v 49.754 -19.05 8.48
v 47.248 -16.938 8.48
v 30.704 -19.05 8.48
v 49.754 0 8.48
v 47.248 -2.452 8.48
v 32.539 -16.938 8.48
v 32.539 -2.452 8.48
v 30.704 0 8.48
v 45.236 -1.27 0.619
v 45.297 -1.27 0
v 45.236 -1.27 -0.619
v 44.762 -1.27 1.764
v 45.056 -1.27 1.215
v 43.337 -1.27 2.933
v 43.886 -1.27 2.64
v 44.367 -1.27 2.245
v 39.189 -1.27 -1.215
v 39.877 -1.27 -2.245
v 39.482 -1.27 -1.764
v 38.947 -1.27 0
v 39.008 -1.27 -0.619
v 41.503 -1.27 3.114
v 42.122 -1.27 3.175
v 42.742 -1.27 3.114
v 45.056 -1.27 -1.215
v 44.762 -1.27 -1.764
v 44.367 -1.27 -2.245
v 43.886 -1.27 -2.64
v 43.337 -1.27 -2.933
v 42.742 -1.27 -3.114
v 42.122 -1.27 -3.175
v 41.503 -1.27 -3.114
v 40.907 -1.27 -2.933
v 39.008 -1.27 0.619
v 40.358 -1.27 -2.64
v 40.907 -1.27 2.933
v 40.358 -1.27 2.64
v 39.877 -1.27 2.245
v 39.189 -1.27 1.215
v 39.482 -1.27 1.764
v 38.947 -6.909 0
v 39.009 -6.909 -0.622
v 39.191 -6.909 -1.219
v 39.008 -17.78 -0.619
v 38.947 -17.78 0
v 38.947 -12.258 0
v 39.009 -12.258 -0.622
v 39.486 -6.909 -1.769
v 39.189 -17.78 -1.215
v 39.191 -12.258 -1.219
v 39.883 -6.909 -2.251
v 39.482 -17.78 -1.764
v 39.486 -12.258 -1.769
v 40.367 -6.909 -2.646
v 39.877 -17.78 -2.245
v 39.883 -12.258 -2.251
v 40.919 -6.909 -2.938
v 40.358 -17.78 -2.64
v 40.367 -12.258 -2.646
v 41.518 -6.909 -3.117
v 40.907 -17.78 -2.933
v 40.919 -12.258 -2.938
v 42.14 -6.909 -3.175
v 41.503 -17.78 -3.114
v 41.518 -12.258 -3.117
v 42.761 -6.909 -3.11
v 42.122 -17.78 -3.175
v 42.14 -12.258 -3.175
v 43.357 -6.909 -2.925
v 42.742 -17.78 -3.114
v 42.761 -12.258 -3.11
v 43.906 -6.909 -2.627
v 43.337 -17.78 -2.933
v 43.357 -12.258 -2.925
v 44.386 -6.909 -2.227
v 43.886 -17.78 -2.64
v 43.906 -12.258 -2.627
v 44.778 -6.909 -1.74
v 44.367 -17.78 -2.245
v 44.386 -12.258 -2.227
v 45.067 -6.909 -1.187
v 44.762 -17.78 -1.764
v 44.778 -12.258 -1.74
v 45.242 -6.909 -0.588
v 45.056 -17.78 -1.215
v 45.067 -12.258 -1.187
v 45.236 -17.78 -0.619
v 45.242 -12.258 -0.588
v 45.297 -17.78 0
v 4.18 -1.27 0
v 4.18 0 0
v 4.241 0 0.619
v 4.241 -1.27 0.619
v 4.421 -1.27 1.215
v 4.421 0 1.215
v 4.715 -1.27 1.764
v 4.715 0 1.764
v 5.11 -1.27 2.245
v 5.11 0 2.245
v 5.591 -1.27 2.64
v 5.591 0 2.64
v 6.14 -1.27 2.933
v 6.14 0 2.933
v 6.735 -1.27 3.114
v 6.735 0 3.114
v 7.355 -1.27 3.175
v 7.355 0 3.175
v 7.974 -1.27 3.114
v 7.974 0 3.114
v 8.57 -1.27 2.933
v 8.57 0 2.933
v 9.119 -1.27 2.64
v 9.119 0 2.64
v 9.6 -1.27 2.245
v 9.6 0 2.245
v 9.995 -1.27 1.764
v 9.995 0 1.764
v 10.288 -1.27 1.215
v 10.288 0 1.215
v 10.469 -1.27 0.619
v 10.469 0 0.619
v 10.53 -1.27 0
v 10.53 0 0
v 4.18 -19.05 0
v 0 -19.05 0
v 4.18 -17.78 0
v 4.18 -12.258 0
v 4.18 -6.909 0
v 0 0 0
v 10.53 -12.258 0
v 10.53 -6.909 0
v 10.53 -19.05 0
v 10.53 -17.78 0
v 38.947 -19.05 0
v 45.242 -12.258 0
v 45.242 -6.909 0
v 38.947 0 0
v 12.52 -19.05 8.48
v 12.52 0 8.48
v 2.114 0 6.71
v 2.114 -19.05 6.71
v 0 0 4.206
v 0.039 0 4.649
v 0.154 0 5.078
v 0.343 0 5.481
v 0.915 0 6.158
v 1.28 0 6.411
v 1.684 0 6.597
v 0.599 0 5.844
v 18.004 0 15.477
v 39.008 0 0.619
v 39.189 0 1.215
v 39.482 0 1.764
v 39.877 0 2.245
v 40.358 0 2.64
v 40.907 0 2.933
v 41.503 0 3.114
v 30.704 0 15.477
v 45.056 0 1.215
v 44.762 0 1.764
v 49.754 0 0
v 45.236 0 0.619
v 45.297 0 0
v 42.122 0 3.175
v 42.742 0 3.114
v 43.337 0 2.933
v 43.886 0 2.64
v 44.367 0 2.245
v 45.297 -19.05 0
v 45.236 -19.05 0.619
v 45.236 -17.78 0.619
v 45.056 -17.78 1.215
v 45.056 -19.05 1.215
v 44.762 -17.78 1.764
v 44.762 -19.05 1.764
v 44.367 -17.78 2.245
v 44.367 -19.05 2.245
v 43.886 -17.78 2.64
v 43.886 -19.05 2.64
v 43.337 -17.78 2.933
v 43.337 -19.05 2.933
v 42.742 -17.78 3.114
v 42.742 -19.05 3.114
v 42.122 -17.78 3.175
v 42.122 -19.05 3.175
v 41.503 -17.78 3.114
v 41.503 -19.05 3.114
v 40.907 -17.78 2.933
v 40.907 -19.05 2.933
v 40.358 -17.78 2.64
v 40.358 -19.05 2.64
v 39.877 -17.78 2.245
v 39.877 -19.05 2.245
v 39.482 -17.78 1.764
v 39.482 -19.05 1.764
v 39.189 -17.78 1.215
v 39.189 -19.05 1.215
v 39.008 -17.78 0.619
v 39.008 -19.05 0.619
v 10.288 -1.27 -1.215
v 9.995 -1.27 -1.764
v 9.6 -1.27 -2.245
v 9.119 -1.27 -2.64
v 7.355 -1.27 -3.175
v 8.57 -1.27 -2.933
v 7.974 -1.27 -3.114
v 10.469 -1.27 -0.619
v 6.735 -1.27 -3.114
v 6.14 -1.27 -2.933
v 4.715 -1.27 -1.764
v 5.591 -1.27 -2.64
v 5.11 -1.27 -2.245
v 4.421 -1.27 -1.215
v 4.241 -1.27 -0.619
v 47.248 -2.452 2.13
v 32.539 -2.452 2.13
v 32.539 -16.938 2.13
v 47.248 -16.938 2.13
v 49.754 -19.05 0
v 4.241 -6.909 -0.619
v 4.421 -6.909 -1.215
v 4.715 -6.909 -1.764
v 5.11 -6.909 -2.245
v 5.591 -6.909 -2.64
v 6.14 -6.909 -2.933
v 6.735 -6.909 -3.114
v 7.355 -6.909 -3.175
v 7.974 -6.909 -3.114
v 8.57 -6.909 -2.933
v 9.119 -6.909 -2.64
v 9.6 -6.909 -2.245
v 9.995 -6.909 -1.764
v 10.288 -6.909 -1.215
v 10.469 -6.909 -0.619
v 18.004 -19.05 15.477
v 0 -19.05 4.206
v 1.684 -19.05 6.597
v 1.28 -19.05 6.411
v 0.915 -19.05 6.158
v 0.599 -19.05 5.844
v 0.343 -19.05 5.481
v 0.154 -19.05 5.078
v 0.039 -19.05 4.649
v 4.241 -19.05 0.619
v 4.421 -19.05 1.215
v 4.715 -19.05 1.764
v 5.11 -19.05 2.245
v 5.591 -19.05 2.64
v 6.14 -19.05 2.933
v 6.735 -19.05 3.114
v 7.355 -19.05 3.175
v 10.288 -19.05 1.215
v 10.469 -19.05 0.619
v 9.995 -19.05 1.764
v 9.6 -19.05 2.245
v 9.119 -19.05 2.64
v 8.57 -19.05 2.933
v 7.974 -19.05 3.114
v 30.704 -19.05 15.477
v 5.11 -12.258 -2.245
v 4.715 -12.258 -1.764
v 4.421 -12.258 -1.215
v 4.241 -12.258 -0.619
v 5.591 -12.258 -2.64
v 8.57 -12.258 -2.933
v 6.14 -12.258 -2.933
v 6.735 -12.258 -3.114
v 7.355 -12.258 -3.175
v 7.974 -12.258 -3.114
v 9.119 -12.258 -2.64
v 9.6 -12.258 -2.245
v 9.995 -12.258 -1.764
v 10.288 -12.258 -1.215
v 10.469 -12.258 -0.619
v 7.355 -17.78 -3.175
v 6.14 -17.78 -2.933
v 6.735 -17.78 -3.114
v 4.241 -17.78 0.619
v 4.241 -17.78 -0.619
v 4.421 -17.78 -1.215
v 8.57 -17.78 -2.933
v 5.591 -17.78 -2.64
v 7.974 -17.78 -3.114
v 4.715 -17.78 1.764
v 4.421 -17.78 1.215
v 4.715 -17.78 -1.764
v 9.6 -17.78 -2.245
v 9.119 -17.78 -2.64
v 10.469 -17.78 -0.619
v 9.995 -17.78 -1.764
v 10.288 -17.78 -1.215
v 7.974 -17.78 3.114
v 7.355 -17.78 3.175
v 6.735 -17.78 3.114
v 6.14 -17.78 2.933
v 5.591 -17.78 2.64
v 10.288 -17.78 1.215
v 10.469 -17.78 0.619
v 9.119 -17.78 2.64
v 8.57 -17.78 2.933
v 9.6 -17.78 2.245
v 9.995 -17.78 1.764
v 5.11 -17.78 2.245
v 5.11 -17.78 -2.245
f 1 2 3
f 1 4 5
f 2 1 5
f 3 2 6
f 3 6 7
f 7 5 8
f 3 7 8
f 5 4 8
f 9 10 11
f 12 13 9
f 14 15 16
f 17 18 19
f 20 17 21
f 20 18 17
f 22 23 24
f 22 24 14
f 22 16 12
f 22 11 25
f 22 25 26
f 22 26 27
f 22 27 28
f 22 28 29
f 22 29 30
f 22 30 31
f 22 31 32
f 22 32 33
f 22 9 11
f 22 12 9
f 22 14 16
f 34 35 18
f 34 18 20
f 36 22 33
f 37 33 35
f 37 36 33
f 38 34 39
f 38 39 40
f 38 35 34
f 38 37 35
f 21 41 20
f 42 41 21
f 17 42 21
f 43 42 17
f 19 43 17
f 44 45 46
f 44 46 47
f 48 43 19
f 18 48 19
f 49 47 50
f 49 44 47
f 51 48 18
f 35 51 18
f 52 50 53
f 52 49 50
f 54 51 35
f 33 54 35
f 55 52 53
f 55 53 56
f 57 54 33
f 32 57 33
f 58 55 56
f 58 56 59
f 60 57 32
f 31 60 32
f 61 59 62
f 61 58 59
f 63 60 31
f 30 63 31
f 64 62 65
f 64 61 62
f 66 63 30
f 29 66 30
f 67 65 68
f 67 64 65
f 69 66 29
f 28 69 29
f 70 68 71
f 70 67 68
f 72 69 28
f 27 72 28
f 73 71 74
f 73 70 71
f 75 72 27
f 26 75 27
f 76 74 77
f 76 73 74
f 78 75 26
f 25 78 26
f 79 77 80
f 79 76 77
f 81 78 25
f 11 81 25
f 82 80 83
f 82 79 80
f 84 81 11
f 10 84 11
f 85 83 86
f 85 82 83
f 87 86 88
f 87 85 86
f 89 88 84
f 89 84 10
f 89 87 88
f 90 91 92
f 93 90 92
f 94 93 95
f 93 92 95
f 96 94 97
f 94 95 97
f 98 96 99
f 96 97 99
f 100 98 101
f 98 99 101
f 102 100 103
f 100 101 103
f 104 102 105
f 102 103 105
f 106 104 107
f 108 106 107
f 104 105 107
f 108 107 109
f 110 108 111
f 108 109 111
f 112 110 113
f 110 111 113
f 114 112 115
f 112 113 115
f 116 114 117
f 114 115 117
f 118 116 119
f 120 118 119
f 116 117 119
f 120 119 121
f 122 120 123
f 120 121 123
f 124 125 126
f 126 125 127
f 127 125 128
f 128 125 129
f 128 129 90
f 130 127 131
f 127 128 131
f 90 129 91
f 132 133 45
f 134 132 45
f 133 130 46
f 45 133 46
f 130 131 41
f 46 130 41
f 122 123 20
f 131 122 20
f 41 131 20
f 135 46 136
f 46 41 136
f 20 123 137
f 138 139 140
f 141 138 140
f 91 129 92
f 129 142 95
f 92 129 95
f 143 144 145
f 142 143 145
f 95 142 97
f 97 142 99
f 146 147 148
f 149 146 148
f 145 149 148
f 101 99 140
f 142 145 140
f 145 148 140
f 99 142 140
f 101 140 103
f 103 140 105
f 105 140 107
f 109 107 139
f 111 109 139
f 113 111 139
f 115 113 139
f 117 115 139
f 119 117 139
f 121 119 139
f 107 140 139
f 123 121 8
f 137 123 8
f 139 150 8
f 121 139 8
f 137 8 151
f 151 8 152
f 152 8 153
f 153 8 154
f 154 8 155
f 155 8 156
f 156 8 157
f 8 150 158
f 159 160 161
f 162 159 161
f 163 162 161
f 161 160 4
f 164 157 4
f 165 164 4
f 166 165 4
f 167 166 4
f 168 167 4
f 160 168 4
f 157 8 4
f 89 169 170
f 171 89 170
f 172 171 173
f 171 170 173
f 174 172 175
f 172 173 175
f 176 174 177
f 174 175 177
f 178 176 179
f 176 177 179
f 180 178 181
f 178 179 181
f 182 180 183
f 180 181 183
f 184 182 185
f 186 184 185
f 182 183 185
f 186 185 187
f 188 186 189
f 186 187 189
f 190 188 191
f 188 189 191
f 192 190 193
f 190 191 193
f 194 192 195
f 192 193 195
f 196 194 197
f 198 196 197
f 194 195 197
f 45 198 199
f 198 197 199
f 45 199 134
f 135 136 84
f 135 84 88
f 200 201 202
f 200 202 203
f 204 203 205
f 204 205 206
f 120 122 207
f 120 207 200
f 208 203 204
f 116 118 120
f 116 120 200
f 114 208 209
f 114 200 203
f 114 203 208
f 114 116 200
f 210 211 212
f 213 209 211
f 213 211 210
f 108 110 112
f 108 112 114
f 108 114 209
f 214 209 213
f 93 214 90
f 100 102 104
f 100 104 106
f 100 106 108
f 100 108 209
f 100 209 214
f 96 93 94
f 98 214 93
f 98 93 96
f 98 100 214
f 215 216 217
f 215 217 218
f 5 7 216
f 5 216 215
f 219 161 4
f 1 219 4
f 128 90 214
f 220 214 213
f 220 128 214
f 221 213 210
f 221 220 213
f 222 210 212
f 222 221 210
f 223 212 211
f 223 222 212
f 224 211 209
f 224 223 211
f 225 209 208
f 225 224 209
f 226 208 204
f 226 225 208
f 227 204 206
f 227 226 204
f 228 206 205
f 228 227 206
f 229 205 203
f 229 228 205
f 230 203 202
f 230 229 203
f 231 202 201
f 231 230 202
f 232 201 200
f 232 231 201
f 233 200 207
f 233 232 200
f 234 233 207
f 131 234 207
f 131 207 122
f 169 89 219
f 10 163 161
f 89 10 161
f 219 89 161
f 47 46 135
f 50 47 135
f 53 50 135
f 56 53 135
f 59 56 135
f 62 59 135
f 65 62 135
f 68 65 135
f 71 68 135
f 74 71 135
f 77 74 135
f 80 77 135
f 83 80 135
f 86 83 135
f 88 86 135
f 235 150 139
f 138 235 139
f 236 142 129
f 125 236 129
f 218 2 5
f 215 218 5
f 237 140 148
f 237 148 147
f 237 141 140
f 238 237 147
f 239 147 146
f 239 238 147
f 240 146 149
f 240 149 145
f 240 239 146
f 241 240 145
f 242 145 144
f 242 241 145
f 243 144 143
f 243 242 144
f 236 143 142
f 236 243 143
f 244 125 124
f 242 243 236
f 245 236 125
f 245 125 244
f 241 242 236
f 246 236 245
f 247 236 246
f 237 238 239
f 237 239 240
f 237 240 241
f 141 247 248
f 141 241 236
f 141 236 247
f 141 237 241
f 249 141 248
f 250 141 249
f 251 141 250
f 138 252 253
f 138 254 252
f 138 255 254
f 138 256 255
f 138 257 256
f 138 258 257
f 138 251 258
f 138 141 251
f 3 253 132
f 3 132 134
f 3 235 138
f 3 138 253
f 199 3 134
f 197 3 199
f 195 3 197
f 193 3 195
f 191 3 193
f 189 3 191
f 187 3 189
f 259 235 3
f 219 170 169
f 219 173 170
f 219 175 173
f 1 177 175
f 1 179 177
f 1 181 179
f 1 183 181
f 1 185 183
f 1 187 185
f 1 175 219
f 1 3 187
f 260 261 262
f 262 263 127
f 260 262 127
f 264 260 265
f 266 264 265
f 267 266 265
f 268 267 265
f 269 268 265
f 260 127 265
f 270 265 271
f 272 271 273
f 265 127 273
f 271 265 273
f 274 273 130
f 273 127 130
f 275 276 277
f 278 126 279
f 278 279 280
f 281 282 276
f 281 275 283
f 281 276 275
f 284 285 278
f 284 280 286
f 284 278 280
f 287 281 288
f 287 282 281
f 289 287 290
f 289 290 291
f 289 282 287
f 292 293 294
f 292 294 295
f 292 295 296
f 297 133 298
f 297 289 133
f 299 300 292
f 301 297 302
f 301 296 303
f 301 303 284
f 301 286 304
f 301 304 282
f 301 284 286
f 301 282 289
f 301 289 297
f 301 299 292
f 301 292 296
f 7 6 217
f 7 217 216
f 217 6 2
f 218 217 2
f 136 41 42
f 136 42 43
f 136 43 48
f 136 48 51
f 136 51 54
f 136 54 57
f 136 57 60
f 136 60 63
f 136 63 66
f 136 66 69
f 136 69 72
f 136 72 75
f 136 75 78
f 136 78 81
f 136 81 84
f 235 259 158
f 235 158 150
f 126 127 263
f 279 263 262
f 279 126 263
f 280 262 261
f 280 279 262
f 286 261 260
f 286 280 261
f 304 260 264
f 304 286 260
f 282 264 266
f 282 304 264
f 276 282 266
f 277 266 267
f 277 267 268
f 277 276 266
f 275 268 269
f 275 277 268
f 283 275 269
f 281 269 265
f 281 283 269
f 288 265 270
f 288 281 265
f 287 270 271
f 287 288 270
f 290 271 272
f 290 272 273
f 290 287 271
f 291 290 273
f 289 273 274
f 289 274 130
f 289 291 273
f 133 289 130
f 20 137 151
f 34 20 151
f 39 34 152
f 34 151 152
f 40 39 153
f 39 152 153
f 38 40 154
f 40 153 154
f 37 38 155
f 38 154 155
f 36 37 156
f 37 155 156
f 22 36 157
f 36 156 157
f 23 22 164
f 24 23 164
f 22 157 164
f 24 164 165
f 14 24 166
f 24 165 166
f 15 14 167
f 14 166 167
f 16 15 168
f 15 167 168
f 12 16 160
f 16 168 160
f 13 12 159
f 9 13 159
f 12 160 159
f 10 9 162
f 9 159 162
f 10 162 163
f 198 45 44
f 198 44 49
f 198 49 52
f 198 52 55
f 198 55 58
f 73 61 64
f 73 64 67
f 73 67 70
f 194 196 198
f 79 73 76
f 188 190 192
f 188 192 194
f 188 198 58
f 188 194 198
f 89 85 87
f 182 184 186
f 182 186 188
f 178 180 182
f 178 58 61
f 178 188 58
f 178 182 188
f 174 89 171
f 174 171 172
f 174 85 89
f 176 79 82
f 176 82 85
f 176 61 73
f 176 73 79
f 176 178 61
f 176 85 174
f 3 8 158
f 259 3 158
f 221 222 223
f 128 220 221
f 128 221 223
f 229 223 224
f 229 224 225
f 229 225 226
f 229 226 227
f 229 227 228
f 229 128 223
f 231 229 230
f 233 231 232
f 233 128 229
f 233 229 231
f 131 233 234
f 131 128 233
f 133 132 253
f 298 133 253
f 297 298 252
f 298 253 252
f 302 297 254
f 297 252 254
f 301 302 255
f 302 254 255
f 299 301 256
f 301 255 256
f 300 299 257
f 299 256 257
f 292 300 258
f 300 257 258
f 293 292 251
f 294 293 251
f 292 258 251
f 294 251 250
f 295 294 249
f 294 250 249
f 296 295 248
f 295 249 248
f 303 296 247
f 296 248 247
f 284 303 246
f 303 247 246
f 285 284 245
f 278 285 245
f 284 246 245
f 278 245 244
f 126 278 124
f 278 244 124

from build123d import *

# Parameters (mm, degrees)
F1_DEPTH  = 19.05
F4_DEPTH  = 19.05
F5_R      = 2.54
F9_DEPTH  = 1.27
F11_DEPTH = 1.27
F13_DEPTH = 1.27
F14_W     = 41.0627422772
F14_H     = 5.3488574922
F15_DEPTH = 22.606
F16_W     = 14.7093571723
F16_H     = 14.4864893518
F17_DEPTH = 6.35


# Not quite as in the source:
# - a feature of the source that left no trace in its solid (it failed there, or was rolled back) is left out


with BuildPart() as f1:
    # F0 (on Front) → F1 (new body)
    with BuildSketch(Plane.XZ):
        Polygon((0, 6.35), (0, 0), (49.7539146826, 0), (49.7539146826, 8.4803946126), (30.7039146826, 8.4803946126), (30.7039146826, 15.4774815776), (18.0039146826, 15.4774815776), (12.5200406866, 8.4803946126), align=None)
    extrude(amount=F1_DEPTH)

    # F2 (on face) + F3 (on face) → F4 (join)
    with BuildSketch(Plane.XZ.offset(19.05)):
        with BuildLine():
            ThreePointArc((4.1796790518, 0), (7.3546790518, -3.175), (10.5296790518, 0))
            Line((10.5296790518, 0), (4.1796790518, 0))
        make_face()
        with BuildLine():
            Line((4.1796790518, 0), (10.5296790518, 0))
            ThreePointArc((10.5296790518, 0), (7.3546790518, 3.175), (4.1796790518, 0))
        make_face()
    with BuildSketch(Plane.XZ.offset(19.05)):
        with BuildLine():
            ThreePointArc((38.9472560108, 0), (42.1222560108, -3.175), (45.2972560108, 0))
            Line((45.2972560108, 0), (38.9472560108, 0))
        make_face()
    extrude(amount=-F4_DEPTH)

    # F5
    f5_edges = [f1.edges().sort_by_distance(p)[0] for p in [
        (0, -9.525, 6.35),
    ]]
    fillet(f5_edges, radius=F5_R)

    # F8 (on face) → F9 (cut)
    with BuildSketch(Plane(origin=(0, 0, 0), x_dir=(-1, 0, 0), z_dir=(0, 1, 0))):
        with BuildLine():
            ThreePointArc((-10.5296790518, 0), (-7.3546790518, -3.175), (-4.1796790518, 0))
            ThreePointArc((-4.1796790518, 0), (-7.3546790518, 3.175), (-10.5296790518, 0))
        make_face()
    extrude(amount=-F9_DEPTH, mode=Mode.SUBTRACT)

    # F10 (on face) → F11 (cut)
    with BuildSketch(Plane(origin=(0, 0, 0), x_dir=(-1, 0, 0), z_dir=(0, 1, 0))):
        with BuildLine():
            ThreePointArc((-45.2972560108, 0), (-42.1222560108, -3.175), (-38.9472560108, 0))
            ThreePointArc((-38.9472560108, 0), (-42.1222560108, 3.175), (-45.2972560108, 0))
        make_face()
    extrude(amount=-F11_DEPTH, mode=Mode.SUBTRACT)

    # F12 (on face) → F13 (cut)
    with BuildSketch(Plane.XZ.offset(19.05)):
        with BuildLine():
            ThreePointArc((38.9472560108, 0), (42.1222560108, -3.175), (45.2972560108, 0))
            ThreePointArc((45.2972560108, 0), (42.1222560108, 3.175), (38.9472560108, 0))
        make_face()
        with BuildLine():
            ThreePointArc((4.1796790518, 0), (7.3546790518, -3.175), (10.5296790518, 0))
            ThreePointArc((10.5296790518, 0), (7.3546790518, 3.175), (4.1796790518, 0))
        make_face()
    extrude(amount=-F13_DEPTH, mode=Mode.SUBTRACT)

    # F14 (on face) → F15 (cut)
    with BuildSketch(Plane(origin=(0, 0, 0), x_dir=(1, 0, 0), z_dir=(0, 0, -1))):
        with Locations((24.7110501904, 9.5833707601)):
            Rectangle(F14_W, F14_H)
    extrude(amount=F15_DEPTH, mode=Mode.SUBTRACT)

    # F16 (on face) → F17 (cut)
    with BuildSketch(Plane.XY.offset(8.4803946126)):
        with Locations((39.8935656995, -9.6948046703)):
            Rectangle(F16_W, F16_H)
    extrude(amount=-F17_DEPTH, mode=Mode.SUBTRACT)


solid = f1.part
